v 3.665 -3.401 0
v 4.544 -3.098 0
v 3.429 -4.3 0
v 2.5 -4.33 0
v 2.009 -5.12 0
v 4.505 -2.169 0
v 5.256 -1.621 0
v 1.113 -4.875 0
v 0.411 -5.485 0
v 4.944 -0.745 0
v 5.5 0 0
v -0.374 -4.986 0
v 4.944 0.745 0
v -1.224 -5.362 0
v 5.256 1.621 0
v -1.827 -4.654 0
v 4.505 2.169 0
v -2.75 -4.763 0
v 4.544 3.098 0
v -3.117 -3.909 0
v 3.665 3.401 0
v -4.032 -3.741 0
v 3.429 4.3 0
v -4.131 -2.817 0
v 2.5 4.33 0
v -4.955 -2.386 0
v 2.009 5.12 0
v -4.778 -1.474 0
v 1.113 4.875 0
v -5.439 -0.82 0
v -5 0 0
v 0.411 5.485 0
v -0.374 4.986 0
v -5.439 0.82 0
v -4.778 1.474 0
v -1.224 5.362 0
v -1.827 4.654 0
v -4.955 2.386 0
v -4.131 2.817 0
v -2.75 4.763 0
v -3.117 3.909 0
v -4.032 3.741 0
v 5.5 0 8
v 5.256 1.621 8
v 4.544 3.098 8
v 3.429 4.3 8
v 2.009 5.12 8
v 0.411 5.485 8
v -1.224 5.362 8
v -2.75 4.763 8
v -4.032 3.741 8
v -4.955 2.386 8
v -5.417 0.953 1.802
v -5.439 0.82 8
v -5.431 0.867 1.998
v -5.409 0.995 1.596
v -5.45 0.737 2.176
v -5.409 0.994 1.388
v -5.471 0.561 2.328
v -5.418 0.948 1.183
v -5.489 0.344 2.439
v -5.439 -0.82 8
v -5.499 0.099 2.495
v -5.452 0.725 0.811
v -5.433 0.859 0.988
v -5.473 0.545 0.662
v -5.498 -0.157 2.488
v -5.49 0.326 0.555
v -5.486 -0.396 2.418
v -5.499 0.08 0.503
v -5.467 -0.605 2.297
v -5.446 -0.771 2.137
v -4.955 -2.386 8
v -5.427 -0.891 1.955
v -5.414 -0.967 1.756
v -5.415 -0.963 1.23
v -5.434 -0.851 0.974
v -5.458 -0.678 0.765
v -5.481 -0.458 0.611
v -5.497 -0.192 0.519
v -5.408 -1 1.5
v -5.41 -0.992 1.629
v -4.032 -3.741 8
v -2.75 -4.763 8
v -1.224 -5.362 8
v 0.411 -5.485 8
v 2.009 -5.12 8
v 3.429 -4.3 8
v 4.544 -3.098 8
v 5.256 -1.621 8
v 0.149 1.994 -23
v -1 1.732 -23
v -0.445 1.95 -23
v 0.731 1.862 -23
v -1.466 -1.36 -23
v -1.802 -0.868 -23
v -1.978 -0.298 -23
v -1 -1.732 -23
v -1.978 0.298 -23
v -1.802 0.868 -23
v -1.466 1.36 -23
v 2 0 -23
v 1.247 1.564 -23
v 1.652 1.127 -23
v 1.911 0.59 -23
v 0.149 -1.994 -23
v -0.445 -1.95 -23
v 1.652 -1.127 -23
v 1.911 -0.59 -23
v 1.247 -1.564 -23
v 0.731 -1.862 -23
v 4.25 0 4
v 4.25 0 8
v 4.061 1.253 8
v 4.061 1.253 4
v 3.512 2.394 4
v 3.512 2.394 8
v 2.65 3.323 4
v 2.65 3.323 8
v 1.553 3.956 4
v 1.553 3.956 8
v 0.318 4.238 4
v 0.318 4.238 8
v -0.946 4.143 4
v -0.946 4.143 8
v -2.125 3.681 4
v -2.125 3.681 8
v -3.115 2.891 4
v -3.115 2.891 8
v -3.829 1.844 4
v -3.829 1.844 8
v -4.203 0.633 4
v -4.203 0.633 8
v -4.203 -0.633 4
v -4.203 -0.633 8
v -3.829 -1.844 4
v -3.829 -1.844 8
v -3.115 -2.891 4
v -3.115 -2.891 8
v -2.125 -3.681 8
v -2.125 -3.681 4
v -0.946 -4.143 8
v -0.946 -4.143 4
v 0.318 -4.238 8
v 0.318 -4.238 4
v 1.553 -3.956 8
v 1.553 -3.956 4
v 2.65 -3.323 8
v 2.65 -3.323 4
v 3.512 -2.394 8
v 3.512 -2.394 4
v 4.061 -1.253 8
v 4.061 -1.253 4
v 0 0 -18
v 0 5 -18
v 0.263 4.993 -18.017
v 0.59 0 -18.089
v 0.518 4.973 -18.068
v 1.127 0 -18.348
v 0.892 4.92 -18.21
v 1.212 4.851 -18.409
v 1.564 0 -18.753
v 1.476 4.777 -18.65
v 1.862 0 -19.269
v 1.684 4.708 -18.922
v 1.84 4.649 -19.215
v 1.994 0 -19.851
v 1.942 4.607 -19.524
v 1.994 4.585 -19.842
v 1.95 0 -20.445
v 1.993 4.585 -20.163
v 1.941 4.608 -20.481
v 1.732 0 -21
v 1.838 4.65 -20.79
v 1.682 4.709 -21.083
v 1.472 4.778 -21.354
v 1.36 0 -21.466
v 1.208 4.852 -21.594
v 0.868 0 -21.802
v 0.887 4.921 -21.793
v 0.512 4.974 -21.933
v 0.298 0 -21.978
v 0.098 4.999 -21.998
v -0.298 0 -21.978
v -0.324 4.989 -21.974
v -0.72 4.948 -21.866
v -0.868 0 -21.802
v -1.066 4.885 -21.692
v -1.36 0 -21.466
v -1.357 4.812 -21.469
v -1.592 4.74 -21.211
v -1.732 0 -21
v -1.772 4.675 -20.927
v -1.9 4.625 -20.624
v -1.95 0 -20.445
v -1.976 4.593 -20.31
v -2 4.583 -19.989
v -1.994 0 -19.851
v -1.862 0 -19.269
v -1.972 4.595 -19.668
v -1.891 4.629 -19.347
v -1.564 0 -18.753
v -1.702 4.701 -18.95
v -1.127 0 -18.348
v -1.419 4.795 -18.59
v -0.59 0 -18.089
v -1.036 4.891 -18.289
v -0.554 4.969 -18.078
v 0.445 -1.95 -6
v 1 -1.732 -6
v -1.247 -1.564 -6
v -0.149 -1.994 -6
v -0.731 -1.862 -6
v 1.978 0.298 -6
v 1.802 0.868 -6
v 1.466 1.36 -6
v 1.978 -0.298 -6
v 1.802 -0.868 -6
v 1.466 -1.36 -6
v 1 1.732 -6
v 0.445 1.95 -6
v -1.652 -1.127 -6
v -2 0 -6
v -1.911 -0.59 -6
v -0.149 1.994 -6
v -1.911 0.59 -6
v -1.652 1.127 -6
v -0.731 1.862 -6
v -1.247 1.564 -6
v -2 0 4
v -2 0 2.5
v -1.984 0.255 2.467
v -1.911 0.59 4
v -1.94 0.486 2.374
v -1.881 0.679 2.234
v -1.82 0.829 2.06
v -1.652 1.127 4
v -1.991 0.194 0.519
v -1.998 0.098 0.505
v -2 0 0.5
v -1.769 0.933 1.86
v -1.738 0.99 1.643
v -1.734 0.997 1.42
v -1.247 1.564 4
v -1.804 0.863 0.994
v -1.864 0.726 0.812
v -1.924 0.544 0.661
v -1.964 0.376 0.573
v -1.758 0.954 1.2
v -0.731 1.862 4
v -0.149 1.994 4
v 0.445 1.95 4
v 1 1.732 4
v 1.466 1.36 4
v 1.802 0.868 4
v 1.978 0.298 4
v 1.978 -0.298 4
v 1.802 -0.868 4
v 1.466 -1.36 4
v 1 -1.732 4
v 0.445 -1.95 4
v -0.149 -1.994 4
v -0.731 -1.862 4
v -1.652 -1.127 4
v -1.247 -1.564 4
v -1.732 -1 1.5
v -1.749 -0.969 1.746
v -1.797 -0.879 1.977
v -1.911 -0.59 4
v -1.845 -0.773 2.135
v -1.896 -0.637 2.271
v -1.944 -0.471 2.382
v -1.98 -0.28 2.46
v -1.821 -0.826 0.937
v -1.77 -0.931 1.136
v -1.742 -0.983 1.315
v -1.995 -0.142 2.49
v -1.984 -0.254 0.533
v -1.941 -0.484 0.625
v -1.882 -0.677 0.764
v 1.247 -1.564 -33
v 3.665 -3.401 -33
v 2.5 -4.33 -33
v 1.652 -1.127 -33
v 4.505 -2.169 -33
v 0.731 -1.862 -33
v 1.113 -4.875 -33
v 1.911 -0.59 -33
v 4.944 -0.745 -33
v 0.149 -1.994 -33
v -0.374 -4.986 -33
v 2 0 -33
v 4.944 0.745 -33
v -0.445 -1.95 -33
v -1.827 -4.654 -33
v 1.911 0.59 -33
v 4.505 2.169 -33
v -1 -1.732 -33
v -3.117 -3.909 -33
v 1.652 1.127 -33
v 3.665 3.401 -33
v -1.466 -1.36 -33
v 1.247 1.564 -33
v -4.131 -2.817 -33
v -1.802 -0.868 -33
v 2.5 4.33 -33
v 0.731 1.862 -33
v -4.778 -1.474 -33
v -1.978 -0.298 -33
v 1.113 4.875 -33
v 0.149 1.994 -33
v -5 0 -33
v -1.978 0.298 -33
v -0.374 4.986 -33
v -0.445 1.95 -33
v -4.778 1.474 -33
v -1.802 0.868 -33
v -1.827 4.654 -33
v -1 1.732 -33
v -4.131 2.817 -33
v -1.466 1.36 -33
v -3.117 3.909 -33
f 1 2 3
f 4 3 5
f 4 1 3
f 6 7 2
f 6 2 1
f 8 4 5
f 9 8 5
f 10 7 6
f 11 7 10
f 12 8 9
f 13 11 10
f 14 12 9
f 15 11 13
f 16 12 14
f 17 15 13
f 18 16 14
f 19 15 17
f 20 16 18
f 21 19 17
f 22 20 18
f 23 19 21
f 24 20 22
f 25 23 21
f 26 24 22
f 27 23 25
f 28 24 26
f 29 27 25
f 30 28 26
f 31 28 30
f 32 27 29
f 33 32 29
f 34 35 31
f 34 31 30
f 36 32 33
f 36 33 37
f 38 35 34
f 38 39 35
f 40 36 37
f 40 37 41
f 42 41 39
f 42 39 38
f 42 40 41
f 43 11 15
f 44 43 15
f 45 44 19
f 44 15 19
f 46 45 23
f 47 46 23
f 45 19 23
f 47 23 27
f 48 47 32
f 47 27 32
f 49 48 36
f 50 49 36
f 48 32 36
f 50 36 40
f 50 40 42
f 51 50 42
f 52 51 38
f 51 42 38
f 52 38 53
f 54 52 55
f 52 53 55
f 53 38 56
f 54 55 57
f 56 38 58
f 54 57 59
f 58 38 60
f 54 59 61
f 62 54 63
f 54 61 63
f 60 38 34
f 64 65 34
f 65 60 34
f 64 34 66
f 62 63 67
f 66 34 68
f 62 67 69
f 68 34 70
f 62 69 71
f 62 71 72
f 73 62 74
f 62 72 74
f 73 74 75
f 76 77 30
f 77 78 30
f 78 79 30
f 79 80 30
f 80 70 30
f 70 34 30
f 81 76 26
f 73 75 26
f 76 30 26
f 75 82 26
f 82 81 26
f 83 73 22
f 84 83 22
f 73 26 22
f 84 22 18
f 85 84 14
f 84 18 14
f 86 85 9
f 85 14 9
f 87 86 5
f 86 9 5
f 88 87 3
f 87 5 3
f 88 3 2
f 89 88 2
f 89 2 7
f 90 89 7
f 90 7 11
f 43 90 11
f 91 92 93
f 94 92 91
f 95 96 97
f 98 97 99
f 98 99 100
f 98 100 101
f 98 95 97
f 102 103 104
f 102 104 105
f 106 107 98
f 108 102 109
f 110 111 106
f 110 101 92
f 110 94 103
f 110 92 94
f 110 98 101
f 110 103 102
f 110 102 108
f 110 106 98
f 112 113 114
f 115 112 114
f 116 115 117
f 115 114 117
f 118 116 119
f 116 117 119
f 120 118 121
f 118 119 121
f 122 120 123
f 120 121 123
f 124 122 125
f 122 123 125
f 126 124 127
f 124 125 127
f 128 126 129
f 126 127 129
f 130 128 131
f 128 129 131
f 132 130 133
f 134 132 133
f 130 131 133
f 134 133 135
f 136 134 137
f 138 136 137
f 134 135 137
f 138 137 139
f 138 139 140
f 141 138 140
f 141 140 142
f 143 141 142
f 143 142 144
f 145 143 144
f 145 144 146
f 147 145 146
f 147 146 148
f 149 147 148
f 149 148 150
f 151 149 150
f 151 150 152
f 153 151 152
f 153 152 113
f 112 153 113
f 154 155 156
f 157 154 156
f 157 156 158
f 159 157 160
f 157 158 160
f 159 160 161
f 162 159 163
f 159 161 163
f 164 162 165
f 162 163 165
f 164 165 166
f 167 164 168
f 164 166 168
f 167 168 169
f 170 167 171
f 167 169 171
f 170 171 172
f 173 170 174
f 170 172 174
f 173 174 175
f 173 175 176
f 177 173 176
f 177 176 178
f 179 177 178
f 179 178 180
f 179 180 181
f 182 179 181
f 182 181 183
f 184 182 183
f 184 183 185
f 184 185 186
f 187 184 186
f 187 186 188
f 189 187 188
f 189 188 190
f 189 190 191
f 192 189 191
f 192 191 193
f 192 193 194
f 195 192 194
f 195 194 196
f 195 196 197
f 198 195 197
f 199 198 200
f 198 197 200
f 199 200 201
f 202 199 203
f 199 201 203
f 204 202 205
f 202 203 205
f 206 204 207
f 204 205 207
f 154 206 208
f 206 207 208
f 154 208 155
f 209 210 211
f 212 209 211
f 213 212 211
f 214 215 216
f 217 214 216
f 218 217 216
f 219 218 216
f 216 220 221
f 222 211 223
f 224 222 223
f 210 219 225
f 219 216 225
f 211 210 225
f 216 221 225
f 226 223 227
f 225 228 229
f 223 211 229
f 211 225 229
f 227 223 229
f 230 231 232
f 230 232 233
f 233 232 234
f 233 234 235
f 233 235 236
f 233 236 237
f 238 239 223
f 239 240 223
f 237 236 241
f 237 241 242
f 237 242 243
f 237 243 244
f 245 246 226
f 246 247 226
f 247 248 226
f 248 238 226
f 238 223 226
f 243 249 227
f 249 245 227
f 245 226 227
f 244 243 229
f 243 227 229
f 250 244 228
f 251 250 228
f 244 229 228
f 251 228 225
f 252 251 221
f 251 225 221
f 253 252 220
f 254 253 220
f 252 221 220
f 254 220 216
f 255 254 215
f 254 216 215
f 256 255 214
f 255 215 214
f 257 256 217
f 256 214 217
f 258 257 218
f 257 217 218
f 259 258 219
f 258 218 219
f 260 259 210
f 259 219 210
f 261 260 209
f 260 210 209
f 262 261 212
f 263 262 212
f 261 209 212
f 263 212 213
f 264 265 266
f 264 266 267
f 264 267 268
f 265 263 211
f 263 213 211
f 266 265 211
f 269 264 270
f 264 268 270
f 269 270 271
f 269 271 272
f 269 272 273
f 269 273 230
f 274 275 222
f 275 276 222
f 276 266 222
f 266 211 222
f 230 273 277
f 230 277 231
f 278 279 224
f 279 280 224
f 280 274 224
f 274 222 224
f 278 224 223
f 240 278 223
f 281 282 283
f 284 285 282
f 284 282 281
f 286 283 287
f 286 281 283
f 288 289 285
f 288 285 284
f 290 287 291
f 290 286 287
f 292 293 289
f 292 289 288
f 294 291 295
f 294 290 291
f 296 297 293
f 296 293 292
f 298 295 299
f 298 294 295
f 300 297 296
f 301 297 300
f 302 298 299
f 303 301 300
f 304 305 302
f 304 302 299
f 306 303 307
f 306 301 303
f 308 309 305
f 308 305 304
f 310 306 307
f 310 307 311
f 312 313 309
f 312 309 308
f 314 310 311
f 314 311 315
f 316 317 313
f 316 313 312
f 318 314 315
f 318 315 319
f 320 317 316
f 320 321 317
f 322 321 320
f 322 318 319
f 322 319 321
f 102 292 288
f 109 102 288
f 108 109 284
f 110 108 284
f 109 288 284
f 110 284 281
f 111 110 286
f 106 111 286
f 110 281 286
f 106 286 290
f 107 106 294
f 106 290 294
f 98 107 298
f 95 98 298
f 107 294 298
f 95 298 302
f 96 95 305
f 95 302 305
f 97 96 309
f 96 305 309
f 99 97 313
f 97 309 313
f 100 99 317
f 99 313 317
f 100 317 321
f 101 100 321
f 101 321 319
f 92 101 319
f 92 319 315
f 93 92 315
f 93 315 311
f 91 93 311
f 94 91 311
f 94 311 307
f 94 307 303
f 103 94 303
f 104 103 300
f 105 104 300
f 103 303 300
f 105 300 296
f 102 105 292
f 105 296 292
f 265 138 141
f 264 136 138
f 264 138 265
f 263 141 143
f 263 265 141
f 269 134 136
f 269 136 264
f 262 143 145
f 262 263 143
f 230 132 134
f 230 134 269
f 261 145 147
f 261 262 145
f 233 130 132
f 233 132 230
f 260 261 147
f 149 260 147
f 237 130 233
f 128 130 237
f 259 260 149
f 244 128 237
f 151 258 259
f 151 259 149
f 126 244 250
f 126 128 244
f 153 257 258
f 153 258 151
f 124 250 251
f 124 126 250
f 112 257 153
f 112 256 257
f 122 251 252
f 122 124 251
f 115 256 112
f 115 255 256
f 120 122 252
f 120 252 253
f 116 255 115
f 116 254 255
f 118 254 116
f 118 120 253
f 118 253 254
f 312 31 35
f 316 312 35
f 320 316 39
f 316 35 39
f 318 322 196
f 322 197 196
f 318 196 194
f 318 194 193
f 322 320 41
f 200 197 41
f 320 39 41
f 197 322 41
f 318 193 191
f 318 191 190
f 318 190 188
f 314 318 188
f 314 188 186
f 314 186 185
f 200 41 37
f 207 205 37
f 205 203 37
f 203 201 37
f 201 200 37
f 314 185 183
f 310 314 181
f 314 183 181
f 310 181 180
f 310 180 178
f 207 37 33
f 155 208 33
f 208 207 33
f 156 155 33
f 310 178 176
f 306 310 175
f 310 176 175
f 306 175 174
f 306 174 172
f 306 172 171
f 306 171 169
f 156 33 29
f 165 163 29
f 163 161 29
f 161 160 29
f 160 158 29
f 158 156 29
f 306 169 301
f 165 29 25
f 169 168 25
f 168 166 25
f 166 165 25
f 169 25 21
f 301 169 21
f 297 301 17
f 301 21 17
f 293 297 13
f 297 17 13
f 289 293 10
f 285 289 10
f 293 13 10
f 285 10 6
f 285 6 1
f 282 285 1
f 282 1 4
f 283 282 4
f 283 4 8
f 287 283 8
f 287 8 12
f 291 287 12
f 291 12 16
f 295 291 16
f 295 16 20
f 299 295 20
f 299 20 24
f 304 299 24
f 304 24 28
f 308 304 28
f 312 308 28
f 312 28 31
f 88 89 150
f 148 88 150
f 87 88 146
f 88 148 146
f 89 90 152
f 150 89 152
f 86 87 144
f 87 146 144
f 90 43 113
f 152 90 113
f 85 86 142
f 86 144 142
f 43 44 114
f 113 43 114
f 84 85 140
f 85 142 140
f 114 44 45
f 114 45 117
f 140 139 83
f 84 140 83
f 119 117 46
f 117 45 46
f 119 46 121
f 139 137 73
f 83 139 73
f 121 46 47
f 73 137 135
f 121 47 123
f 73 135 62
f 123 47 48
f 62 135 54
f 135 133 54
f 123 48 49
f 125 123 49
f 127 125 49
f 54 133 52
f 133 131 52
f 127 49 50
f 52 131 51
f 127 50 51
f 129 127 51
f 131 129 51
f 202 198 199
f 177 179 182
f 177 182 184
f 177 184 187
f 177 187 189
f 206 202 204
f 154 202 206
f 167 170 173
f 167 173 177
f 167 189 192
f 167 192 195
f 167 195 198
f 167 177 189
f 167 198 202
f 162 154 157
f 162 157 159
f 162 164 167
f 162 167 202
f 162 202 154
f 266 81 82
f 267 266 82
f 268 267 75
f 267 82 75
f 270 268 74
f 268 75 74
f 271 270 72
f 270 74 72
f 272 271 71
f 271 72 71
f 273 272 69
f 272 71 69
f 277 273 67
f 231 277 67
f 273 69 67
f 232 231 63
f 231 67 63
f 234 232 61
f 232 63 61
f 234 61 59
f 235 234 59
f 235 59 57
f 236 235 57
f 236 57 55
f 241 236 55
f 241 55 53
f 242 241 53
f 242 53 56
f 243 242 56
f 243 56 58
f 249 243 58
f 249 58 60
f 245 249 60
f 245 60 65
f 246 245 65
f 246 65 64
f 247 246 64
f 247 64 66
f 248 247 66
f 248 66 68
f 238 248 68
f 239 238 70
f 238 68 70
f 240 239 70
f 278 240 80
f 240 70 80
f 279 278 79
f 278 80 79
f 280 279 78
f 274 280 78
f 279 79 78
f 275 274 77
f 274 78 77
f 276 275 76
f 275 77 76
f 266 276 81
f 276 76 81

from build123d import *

# Parameters (mm, degrees)
SKETCH1_W                                          = 5.5
SKETCH1_H                                          = 8
SKETCH2_R                                          = 5
BOSS_EXTRUDE1_DEPTH                                = 33
CBORE_FOR_M3_5_HEX_HEAD_MACHINE_SCREW1_D           = 4
CBORE_FOR_M3_5_HEX_HEAD_MACHINE_SCREW1_DEPTH       = 14
CBORE_FOR_M3_5_HEX_HEAD_MACHINE_SCREW1_CBORE_D     = 8.5
CBORE_FOR_M3_5_HEX_HEAD_MACHINE_SCREW1_CBORE_DEPTH = 4
HOLE1_REACH                                        = 38.626
HOLE1_BORE_R                                       = 1
SKETCH6_R                                          = 2
CUT_EXTRUDE1_DEPTH                                 = 10
SKETCH7_R                                          = 2
CUT_EXTRUDE2_DEPTH                                 = 5


with BuildPart() as part:
    # Sketch1 → Revolve1 (revolve)
    with BuildSketch(Plane(origin=(0, 0, 0), x_dir=(1, 0, 0), z_dir=(0, 1, 0))):
        with Locations((2.75, -4)):
            Rectangle(SKETCH1_W, SKETCH1_H)
    revolve(axis=Axis((0, 0, 0), (0, 0, 1)))

    # Sketch2 → Boss-Extrude1 (add)
    with BuildSketch(Plane(origin=(0, 0, 0), x_dir=(-1, 0, 0), z_dir=(0, 0, -1))):
        Circle(SKETCH2_R)
    extrude(amount=BOSS_EXTRUDE1_DEPTH)

    # CBORE for M3.5 Hex Head Machine Screw1
    with Locations(Plane.XY.offset(8)):
        with Locations((0, 0)):
            CounterBoreHole(CBORE_FOR_M3_5_HEX_HEAD_MACHINE_SCREW1_D / 2, CBORE_FOR_M3_5_HEX_HEAD_MACHINE_SCREW1_CBORE_D / 2, CBORE_FOR_M3_5_HEX_HEAD_MACHINE_SCREW1_CBORE_DEPTH, depth=CBORE_FOR_M3_5_HEX_HEAD_MACHINE_SCREW1_DEPTH)

    # Hole1 bore (on position points) → Hole1 (cut, up to next)
    with BuildSketch(Plane(origin=(-5.5, 0, 1.5), x_dir=(0, -1, 0), z_dir=(-1, 0, 0)), mode=Mode.PRIVATE) as hole1_sk1:
        Circle(HOLE1_BORE_R)
    hole1_tool1 = extrude(hole1_sk1.sketch, amount=-HOLE1_REACH, mode=Mode.PRIVATE) & part.part
    add(hole1_tool1.solids().sort_by_distance((-5.5, 0, 1.5))[0], mode=Mode.SUBTRACT)

    # Sketch6 → Cut-Extrude1 (cut)
    with BuildSketch(Plane(origin=(0, 0, -33), x_dir=(-1, 0, 0), z_dir=(0, 0, -1))):
        with Locations(Location((0, 0, 0), (0, 0, 180))):
            Circle(SKETCH6_R)
    extrude(amount=-CUT_EXTRUDE1_DEPTH, mode=Mode.SUBTRACT)

    # Sketch7 → Cut-Extrude2 (cut)
    with BuildSketch(Plane(origin=(0, 5, 0), x_dir=(1, 0, 0), z_dir=(0, 1, 0))):
        with Locations(Location((0, 20, 0), (0, 0, 270))):
            Circle(SKETCH7_R)
    extrude(amount=-CUT_EXTRUDE2_DEPTH, mode=Mode.SUBTRACT)


solid = part.part
